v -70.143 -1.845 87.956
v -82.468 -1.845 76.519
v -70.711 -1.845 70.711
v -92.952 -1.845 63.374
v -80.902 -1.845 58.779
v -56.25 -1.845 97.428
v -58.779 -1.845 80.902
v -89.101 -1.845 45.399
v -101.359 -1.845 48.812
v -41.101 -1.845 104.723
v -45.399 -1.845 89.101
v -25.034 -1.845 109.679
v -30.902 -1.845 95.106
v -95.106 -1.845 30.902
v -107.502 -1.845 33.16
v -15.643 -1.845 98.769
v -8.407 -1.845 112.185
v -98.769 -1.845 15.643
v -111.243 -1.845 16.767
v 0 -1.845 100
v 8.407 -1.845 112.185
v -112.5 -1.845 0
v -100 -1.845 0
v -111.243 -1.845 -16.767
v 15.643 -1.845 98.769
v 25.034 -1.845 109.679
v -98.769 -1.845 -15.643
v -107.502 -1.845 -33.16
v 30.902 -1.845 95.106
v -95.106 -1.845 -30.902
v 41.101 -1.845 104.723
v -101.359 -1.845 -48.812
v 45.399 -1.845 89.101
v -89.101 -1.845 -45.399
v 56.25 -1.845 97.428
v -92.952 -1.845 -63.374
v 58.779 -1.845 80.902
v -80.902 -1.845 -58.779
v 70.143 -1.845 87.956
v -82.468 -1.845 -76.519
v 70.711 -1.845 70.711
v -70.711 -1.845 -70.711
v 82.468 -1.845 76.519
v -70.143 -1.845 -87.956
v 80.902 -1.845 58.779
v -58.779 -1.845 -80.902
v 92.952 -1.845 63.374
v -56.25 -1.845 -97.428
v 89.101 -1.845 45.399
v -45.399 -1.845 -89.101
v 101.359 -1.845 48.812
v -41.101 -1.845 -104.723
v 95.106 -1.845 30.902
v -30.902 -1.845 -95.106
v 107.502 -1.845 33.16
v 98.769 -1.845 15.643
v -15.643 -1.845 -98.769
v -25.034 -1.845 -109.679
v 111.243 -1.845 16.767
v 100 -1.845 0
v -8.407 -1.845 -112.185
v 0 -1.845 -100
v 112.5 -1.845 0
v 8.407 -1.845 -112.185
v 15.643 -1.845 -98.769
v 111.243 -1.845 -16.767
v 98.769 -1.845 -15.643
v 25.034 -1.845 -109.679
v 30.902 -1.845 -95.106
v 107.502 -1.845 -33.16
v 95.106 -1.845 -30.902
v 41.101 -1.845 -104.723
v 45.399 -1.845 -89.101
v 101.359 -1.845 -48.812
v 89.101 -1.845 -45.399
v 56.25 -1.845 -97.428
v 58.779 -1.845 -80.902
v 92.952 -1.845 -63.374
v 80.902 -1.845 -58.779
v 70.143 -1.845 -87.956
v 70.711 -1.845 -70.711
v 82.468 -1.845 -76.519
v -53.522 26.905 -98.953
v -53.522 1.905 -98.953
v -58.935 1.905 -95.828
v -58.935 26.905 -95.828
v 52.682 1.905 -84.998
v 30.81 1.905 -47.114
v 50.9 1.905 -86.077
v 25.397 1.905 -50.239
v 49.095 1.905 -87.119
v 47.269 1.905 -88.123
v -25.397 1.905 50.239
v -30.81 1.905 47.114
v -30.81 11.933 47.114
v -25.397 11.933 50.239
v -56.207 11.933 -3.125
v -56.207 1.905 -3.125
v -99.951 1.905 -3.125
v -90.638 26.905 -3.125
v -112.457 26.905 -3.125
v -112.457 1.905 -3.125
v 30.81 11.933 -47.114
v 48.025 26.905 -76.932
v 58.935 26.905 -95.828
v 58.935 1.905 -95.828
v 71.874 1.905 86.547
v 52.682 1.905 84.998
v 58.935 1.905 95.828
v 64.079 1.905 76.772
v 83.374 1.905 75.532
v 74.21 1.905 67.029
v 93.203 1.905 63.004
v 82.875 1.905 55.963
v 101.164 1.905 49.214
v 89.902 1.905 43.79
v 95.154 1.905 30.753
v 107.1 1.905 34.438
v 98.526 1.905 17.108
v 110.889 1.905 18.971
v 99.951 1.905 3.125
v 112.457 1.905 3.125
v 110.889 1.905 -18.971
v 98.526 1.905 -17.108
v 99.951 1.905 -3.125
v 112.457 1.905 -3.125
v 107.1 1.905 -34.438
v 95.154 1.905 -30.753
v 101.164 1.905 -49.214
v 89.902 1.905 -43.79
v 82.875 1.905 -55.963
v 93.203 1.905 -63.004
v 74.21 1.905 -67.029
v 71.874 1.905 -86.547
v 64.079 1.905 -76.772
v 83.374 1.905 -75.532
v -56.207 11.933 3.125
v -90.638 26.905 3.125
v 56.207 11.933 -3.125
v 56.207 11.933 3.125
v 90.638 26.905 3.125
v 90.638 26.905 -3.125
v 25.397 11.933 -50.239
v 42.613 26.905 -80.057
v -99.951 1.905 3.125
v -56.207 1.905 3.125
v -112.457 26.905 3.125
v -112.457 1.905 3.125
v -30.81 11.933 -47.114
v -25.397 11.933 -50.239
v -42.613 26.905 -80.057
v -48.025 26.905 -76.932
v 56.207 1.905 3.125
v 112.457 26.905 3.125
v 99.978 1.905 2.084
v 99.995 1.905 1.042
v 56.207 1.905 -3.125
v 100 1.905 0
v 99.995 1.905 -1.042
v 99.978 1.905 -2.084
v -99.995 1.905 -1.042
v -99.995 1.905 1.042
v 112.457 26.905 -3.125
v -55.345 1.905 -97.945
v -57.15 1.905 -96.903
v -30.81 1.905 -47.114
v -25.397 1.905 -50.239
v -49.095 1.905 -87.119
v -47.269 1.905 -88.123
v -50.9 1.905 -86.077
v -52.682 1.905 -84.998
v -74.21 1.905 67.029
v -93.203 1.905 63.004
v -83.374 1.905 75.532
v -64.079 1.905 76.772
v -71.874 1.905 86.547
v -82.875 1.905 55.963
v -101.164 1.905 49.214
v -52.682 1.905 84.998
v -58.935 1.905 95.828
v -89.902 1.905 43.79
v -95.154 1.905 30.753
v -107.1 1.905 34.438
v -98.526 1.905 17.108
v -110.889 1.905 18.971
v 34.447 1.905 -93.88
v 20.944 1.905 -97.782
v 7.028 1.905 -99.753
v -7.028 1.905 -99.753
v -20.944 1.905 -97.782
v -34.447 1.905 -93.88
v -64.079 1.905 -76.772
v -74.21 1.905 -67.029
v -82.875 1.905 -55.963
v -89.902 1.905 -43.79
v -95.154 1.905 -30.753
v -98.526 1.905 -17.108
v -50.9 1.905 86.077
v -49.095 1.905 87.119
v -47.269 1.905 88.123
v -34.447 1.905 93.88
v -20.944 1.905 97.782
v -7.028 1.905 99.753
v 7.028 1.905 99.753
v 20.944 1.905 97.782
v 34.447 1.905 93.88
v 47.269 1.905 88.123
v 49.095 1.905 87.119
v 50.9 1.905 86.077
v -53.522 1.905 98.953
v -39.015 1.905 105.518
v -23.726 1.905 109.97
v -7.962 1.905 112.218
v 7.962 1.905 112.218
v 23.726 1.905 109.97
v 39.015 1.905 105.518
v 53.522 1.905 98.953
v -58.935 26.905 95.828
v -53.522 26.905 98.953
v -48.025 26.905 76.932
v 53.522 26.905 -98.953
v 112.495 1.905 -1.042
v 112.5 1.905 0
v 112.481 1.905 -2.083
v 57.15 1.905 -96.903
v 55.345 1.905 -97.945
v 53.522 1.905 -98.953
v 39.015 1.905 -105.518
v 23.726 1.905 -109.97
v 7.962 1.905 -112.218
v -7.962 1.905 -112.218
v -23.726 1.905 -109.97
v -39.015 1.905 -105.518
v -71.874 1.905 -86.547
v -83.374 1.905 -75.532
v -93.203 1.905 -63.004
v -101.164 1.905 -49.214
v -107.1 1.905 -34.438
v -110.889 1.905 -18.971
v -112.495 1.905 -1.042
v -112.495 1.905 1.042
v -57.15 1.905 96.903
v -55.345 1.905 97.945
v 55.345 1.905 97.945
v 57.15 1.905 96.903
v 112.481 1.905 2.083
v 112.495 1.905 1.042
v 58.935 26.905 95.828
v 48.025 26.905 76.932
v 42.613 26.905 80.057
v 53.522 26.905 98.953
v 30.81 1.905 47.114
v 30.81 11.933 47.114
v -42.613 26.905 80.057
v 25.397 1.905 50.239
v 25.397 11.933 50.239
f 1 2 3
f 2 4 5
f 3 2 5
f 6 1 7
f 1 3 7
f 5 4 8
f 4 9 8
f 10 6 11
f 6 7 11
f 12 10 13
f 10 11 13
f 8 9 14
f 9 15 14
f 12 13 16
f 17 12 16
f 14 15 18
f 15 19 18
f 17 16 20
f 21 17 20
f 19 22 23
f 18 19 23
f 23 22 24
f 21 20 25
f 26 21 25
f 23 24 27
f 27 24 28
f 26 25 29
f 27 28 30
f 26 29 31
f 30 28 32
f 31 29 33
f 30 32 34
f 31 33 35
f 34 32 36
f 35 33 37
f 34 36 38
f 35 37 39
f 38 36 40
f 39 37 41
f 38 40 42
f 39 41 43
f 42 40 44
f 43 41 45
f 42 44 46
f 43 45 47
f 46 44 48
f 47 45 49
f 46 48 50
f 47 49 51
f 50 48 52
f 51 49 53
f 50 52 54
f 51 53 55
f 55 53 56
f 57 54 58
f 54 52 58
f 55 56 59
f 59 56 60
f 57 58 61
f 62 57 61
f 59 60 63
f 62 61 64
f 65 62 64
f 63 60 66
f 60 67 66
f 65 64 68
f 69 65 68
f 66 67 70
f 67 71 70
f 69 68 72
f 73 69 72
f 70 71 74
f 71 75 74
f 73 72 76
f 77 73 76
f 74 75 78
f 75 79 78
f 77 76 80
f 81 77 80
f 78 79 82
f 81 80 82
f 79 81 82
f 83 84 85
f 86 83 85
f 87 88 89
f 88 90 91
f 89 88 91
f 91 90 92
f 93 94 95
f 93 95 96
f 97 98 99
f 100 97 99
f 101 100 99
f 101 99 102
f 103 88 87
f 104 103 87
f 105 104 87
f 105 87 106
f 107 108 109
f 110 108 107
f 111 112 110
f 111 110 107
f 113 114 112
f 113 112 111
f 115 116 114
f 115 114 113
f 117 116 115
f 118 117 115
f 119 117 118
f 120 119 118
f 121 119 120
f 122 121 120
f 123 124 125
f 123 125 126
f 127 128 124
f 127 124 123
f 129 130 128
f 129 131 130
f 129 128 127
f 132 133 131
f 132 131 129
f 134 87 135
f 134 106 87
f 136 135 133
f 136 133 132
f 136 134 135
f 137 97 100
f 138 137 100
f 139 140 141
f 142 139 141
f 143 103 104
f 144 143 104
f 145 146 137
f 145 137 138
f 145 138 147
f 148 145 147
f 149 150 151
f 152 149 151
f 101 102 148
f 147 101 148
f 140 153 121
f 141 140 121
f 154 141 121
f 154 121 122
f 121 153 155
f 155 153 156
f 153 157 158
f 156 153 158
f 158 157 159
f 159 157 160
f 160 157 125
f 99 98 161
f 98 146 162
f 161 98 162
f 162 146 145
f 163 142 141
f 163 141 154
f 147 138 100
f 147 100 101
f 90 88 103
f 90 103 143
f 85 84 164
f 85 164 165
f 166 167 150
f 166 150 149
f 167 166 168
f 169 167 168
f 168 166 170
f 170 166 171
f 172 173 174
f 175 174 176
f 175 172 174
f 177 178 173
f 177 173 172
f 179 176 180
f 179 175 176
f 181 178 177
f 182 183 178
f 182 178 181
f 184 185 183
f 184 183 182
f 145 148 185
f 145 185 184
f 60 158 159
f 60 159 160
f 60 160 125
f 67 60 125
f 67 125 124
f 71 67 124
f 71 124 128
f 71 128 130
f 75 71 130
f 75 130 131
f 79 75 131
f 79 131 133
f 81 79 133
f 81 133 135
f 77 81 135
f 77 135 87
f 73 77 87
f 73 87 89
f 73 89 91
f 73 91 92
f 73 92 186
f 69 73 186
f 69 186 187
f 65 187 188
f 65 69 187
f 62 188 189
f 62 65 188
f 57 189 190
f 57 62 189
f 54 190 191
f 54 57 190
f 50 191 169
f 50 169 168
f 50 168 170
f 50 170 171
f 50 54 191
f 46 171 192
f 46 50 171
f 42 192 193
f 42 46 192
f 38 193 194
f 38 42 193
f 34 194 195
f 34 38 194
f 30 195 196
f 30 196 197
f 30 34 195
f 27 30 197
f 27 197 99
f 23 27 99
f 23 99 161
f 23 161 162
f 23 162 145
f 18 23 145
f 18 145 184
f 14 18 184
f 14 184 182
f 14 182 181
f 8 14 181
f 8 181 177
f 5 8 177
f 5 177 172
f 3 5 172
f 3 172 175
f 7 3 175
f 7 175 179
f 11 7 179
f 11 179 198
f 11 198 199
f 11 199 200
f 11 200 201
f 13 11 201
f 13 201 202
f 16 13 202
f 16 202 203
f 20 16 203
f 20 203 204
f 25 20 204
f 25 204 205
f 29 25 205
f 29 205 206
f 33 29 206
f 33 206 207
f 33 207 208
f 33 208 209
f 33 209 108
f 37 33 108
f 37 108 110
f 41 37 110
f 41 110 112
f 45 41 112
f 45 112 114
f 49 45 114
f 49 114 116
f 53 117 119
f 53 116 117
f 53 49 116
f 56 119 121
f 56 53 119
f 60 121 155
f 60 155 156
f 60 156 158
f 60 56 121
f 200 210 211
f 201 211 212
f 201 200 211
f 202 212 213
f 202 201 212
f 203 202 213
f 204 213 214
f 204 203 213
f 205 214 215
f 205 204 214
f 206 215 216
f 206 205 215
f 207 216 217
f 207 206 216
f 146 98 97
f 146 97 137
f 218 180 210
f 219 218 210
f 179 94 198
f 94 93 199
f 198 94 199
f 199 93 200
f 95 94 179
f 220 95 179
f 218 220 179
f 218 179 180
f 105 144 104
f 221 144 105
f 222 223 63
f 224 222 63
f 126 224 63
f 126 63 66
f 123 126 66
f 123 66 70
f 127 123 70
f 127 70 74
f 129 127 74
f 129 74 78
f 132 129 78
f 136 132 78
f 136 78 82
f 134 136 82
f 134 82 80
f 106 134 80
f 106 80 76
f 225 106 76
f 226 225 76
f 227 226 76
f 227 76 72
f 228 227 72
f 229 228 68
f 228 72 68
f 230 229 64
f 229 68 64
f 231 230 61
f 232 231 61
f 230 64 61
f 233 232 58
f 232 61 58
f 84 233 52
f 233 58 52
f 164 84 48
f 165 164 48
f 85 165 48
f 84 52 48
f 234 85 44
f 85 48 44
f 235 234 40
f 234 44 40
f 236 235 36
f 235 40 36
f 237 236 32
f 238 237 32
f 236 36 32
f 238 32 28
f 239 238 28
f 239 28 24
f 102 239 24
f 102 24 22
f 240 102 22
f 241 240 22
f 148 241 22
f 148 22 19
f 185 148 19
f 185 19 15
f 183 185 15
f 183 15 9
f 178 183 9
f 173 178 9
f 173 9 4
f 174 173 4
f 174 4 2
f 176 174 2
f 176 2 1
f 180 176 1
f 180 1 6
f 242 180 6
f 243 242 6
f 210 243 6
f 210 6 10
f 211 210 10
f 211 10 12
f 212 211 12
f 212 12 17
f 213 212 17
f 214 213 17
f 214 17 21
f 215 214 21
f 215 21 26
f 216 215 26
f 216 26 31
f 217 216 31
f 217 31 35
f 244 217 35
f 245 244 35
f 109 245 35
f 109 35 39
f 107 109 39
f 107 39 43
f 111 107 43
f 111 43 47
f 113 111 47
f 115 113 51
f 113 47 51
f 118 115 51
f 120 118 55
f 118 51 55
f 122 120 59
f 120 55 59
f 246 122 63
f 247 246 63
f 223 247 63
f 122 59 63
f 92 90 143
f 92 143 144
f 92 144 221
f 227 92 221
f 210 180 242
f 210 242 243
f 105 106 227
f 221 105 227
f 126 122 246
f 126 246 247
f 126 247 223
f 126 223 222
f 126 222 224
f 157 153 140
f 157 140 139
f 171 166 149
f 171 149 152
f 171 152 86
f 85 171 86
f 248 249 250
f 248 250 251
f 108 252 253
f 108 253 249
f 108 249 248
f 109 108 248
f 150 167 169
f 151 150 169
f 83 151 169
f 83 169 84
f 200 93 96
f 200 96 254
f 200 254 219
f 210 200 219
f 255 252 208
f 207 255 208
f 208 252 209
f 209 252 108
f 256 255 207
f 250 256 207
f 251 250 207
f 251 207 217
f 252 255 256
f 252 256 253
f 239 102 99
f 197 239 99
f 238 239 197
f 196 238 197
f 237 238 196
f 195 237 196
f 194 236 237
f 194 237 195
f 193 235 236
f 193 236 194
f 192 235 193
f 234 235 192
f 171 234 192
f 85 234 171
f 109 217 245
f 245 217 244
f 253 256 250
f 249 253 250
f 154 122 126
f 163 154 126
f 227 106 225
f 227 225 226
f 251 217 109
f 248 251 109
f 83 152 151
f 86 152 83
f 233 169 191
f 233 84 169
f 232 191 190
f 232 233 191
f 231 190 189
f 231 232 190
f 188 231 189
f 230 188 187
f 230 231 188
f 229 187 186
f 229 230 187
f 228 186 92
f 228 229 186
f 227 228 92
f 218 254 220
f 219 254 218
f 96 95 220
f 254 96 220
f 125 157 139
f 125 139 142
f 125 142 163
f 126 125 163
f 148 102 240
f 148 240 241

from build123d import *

# Parameters (mm, degrees)
SKETCH1_R           = 90
SKETCH1_R_2         = 80
EXTRUDE_THIN1_DEPTH = 3
SKETCH2_W           = 45
SKETCH2_H           = 5
BOSS_EXTRUDE1_DEPTH = 20
CUT_EXTRUDE1_DEPTH  = 5
CIRPATTERN1_COUNT   = 6
SCALE1_SCALE        = 1.25


with BuildPart() as part:
    # Sketch1 → Extrude-Thin1 (new body)
    with BuildSketch(Plane(origin=(0, 0, 0), x_dir=(1, 0, 0), z_dir=(0, 1, 0))):
        Circle(SKETCH1_R)
        Circle(SKETCH1_R_2, mode=Mode.SUBTRACT)
    extrude(amount=EXTRUDE_THIN1_DEPTH)

    # Sketch2 → Boss-Extrude1 (add)
    with BuildSketch(Plane(origin=(0, 3, 0), x_dir=(1, 0, 0), z_dir=(0, 1, 0))):
        with Locations((67.465271077, 0)):
            Rectangle(SKETCH2_W, SKETCH2_H)
    boss_extrude1 = extrude(amount=BOSS_EXTRUDE1_DEPTH)

    # Sketch3 → Cut-Extrude1 (cut)
    with BuildSketch(Plane.XY.offset(2.5)):
        Polygon((44.965271077, 11.022693862), (72.510497513, 23), (44.965271077, 23), align=None)
    cut_extrude1 = extrude(amount=-CUT_EXTRUDE1_DEPTH, mode=Mode.SUBTRACT)

    # CirPattern1: Boss-Extrude1, Cut-Extrude1 ×6 about axis
    cirpattern1_axis = Axis((0, 0, 0), (0, 1, 0))
    for i in range(1, CIRPATTERN1_COUNT):
        add(boss_extrude1.rotate(cirpattern1_axis, i * 360 / CIRPATTERN1_COUNT))
        add(cut_extrude1.rotate(cirpattern1_axis, i * 360 / CIRPATTERN1_COUNT), mode=Mode.SUBTRACT)


with BuildPart() as part_1:
    # Scale1: scaled about (0, 7.379680738, 0)
    add(part.part.scale(SCALE1_SCALE).moved(Location((0, -1.844920185, 0))))


solid = part_1.part
